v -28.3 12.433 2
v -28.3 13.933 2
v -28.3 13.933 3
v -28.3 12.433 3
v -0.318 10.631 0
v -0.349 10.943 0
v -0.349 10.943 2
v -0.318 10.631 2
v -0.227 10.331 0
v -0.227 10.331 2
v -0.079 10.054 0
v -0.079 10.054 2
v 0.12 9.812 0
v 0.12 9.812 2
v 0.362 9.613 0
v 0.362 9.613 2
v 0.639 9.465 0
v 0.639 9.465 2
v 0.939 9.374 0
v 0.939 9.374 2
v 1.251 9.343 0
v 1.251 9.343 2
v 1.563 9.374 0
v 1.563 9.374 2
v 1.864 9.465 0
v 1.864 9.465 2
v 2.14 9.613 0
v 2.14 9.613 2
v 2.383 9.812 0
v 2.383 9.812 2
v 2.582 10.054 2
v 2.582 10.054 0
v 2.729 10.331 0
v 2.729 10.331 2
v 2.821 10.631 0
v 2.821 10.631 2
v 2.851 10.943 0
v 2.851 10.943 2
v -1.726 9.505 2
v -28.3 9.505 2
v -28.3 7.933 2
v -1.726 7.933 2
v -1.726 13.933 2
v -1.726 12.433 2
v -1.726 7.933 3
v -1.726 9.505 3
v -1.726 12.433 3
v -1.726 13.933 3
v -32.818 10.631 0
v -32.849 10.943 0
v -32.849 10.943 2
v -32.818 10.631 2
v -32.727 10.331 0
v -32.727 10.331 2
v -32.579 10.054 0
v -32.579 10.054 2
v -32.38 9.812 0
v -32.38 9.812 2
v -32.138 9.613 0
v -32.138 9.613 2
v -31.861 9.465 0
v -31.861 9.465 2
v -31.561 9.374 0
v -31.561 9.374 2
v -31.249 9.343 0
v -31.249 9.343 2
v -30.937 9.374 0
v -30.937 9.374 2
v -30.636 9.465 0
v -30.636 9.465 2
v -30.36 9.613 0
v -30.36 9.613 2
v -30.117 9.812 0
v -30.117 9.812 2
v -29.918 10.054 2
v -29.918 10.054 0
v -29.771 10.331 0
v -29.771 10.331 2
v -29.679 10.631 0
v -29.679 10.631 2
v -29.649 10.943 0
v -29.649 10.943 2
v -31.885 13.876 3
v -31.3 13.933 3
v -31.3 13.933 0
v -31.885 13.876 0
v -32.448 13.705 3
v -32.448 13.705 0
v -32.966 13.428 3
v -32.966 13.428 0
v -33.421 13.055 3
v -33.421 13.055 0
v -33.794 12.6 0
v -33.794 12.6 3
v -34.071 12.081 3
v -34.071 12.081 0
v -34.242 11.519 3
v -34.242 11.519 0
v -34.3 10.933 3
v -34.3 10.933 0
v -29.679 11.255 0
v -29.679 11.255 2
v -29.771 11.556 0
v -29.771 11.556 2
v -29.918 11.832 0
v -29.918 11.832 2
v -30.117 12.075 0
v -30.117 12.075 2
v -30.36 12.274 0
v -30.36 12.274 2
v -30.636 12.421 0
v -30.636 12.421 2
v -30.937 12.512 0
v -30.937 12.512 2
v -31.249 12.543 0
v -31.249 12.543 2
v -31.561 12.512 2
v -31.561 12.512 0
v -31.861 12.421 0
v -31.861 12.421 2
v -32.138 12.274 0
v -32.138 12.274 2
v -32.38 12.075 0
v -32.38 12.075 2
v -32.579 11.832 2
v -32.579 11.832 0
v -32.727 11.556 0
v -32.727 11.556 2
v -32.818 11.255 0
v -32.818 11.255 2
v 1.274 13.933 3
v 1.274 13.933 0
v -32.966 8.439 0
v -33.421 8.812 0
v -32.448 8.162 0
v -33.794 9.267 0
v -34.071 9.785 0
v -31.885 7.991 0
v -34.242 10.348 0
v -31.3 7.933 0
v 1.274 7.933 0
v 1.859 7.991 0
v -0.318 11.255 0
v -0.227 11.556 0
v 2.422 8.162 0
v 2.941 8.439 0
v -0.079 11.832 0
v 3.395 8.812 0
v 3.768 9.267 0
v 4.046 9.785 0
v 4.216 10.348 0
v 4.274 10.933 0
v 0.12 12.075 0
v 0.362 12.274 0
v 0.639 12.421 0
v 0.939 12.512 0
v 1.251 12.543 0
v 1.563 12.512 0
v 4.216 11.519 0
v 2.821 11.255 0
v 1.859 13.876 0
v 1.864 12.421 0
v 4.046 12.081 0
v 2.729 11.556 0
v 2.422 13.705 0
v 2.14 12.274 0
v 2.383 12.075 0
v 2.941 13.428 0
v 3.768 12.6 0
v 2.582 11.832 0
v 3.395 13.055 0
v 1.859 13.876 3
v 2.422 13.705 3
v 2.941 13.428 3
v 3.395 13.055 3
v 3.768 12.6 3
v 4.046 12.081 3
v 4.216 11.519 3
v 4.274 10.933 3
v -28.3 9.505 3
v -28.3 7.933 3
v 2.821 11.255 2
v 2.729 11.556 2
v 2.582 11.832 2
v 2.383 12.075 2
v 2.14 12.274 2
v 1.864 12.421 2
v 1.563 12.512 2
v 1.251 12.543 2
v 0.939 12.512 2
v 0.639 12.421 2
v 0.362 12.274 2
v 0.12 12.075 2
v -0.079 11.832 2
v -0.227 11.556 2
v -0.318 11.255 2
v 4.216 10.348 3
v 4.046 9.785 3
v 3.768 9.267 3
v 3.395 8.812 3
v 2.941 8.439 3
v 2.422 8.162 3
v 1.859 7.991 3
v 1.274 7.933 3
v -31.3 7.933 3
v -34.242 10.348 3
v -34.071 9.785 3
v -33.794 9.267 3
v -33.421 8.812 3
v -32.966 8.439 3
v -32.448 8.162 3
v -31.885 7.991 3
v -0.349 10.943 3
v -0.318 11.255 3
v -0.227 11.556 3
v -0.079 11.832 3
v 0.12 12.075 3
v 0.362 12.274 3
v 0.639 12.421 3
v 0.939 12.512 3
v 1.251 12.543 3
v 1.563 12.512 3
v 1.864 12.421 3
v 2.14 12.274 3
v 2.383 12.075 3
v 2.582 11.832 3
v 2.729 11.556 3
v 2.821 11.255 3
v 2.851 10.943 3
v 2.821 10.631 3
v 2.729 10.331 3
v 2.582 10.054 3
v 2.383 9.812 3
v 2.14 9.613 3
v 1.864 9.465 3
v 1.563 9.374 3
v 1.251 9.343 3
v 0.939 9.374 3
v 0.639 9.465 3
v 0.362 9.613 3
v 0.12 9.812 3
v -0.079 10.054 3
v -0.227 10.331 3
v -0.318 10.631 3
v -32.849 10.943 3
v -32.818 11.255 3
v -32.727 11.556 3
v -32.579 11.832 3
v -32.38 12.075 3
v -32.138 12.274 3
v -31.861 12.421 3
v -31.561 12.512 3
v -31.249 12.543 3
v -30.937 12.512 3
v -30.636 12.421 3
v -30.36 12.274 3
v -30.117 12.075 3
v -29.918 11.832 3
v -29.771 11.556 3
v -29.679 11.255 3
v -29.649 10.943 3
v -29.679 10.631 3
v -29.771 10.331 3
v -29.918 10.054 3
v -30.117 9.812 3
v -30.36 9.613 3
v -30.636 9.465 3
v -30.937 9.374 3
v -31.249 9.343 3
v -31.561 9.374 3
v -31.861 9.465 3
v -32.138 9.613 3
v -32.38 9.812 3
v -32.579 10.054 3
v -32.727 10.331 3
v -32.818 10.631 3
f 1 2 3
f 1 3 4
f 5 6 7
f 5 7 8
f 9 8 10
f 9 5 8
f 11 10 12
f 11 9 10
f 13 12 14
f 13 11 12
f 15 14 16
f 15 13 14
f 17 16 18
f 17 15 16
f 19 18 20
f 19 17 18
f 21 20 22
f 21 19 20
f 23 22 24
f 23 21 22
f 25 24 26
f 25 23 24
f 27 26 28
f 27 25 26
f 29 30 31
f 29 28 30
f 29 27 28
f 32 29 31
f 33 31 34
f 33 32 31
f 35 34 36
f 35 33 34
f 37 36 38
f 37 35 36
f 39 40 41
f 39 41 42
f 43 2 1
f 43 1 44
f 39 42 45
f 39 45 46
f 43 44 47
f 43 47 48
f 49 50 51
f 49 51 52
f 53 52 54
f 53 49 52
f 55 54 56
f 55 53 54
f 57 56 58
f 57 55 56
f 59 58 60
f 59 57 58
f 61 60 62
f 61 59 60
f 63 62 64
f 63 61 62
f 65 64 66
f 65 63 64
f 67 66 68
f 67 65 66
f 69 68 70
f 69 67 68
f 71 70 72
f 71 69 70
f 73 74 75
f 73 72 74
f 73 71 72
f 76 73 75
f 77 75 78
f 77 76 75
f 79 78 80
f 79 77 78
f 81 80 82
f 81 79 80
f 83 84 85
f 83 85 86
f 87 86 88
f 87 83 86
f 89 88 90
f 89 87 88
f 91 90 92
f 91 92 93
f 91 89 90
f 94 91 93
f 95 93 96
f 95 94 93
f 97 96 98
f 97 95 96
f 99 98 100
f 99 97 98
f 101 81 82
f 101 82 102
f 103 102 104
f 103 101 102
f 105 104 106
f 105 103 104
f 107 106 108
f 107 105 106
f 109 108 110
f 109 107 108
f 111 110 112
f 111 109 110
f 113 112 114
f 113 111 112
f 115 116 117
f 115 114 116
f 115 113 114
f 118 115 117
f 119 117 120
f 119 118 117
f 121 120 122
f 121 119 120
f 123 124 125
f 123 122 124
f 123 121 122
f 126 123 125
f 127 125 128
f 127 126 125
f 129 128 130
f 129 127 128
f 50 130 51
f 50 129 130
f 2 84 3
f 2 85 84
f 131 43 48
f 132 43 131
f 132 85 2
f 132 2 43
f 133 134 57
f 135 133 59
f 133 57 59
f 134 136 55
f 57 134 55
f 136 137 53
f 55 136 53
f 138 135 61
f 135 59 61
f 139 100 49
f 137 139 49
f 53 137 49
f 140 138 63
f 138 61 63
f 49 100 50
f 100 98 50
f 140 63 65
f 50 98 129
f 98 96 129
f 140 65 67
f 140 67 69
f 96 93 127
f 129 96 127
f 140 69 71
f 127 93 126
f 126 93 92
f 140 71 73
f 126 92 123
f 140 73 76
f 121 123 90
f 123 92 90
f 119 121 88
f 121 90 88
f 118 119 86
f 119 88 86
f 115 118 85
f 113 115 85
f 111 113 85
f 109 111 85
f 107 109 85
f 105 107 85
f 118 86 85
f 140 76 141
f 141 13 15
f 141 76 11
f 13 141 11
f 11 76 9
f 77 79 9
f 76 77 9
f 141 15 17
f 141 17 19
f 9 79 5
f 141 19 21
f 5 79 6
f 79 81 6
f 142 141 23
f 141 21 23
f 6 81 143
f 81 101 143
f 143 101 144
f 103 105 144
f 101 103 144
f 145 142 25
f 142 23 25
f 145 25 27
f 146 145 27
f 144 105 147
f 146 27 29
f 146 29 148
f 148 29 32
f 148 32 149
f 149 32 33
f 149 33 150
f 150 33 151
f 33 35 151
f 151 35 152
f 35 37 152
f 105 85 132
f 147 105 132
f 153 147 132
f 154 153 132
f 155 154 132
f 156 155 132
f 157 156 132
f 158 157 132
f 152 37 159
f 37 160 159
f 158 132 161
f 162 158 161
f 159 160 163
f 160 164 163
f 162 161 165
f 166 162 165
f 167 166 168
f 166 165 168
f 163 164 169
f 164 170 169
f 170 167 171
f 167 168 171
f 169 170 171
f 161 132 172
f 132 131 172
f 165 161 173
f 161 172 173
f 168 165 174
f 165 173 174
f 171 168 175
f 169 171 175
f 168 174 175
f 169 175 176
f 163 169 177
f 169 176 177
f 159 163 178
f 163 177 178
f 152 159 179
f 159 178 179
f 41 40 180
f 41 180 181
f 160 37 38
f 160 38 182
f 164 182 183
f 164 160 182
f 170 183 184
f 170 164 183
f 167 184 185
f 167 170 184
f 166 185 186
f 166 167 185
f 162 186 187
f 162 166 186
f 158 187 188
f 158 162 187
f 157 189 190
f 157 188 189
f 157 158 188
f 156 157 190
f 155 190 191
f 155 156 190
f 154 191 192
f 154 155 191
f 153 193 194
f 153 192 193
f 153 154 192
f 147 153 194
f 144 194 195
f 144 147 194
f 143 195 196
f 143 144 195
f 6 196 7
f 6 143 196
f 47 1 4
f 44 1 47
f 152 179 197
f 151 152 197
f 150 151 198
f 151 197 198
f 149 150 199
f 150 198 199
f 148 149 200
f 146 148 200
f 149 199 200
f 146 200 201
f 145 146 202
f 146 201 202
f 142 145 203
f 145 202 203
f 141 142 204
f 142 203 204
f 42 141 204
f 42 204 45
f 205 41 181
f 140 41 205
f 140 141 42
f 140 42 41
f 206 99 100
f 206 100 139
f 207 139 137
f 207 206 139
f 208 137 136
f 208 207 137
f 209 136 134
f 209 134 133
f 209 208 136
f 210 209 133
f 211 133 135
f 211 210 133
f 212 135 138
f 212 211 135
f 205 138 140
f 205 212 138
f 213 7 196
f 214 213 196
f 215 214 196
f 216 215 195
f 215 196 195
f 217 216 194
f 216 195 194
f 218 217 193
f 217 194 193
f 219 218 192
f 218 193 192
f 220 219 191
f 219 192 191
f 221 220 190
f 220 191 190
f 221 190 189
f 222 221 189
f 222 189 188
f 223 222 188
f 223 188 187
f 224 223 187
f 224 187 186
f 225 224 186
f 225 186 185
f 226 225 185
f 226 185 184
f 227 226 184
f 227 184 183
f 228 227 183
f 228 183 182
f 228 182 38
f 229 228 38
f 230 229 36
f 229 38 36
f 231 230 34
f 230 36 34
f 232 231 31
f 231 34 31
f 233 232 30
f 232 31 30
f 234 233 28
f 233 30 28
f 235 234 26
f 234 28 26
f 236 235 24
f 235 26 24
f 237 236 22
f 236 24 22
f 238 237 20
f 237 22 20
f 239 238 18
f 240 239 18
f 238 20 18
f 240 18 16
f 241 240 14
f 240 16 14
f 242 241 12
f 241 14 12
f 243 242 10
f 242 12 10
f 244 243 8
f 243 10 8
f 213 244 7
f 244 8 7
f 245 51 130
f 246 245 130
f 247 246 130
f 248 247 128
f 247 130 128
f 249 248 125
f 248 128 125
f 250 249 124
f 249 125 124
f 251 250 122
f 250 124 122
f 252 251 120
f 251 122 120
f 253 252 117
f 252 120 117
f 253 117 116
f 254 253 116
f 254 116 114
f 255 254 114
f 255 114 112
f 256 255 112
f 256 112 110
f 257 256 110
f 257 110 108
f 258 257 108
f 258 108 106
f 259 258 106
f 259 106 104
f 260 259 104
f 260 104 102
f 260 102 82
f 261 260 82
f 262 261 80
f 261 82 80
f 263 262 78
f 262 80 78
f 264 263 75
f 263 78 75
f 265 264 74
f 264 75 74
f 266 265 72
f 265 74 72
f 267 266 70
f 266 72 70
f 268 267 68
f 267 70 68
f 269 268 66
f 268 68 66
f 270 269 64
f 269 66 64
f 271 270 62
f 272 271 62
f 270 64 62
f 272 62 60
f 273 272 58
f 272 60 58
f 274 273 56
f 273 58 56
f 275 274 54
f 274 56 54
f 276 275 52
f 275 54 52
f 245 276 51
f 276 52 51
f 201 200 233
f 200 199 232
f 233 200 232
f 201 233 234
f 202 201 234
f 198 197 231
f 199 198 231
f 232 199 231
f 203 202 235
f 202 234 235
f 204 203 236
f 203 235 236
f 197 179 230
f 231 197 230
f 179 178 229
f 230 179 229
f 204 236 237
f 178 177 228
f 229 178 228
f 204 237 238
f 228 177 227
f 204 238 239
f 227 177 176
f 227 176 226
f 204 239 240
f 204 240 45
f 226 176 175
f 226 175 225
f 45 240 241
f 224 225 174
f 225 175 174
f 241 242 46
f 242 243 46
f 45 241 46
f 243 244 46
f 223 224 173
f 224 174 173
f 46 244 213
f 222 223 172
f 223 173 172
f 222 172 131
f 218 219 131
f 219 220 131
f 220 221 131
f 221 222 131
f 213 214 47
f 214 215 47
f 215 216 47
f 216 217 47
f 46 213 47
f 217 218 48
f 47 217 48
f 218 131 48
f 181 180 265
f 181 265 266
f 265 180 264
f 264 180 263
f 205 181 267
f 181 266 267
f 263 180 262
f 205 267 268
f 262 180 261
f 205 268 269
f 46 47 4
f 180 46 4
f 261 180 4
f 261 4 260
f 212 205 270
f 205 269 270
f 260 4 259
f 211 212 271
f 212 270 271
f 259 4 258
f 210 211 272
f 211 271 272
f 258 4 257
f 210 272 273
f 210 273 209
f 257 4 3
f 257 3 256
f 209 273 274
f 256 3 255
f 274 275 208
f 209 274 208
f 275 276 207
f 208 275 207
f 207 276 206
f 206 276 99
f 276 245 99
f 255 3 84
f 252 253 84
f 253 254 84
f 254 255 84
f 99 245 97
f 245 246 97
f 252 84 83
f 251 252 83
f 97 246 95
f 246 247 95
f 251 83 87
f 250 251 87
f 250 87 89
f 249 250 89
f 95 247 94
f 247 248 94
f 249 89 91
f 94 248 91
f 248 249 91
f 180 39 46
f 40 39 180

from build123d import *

# Parameters (mm, degrees)
SZKIC1_W                        = 38.573617051
SZKIC1_H                        = 6
DODANIE_WYCI_GNI_CIE1_DEPTH     = 2
WYTNIJ_WYCI_GNI_CIE2_DEPTH      = 1
WYTNIJ_WYCI_GNI_CIE2_DEPTH_BACK = 38.075597401
SZKIC3_R                        = 1.6
DODANIE_WYCI_GNI_CIE2_DEPTH     = 1
SZKIC5_R                        = 1.6
WYTNIJ_WYCI_GNI_CIE3_DEPTH      = 38.142965991
ZAOKR_GLENIE1_R                 = 3


with BuildPart() as part:
    # Szkic1 → Dodanie-wyciągnięcie1 (new body)
    with BuildSketch(Plane.XY):
        with Locations((-15.012785421, 10.933333333)):
            Rectangle(SZKIC1_W, SZKIC1_H)
    extrude(amount=DODANIE_WYCI_GNI_CIE1_DEPTH)

    # Szkic3 → Wytnij-wyciągnięcie2 (cut, two sides: drawn at the far end of the back side and taken through both)
    with BuildSketch(Plane.XY.offset(2).offset(-WYTNIJ_WYCI_GNI_CIE2_DEPTH_BACK)):
        with Locations((-31.24872203, 10.943210033)):
            Circle(SZKIC3_R)
        with Locations((1.25127797, 10.943210033)):
            Circle(SZKIC3_R)
    extrude(amount=WYTNIJ_WYCI_GNI_CIE2_DEPTH + WYTNIJ_WYCI_GNI_CIE2_DEPTH_BACK, mode=Mode.SUBTRACT)

    # Szkic4 → Dodanie-wyciągnięcie2 (add)
    with BuildSketch(Plane.XY.offset(2)):
        Polygon((-34.299593946, 13.933333333), (-28.299593946, 13.933333333), (-28.299593946, 12.433333333), (-1.725976895, 12.433333333), (-1.725976895, 13.933333333), (4.274023105, 13.933333333), (4.274023105, 7.933333333), (-1.725976895, 7.933333333), (-1.725976895, 9.504700568), (-28.299593946, 9.504700568), (-28.299593946, 7.933333333), (-34.299593946, 7.933333333), align=None)
    extrude(amount=DODANIE_WYCI_GNI_CIE2_DEPTH)

    # Szkic5 → Wytnij-wyciągnięcie3 (cut, through all)
    with BuildSketch(Plane(origin=(0, 0, 0), x_dir=(-1, 0, 0), z_dir=(0, 0, -1))):
        with Locations((-1.25127797, 10.943210033)):
            Circle(SZKIC5_R)
        with Locations((31.24872203, 10.943210033)):
            Circle(SZKIC5_R)
    extrude(amount=-WYTNIJ_WYCI_GNI_CIE3_DEPTH, mode=Mode.SUBTRACT)

    # Zaokrąglenie1
    zaokr_glenie1_edges = [part.edges().sort_by_distance(p)[0] for p in [
        (-34.299593946, 7.933333333, 1.5),
        (-34.299593946, 13.933333333, 1.5),
        (4.274023105, 7.933333333, 1.5),
        (4.274023105, 13.933333333, 1.5),
    ]]
    fillet(zaokr_glenie1_edges, radius=ZAOKR_GLENIE1_R - 0.0001)  # a hair under: the kernel refuses the full size


solid = part.part
